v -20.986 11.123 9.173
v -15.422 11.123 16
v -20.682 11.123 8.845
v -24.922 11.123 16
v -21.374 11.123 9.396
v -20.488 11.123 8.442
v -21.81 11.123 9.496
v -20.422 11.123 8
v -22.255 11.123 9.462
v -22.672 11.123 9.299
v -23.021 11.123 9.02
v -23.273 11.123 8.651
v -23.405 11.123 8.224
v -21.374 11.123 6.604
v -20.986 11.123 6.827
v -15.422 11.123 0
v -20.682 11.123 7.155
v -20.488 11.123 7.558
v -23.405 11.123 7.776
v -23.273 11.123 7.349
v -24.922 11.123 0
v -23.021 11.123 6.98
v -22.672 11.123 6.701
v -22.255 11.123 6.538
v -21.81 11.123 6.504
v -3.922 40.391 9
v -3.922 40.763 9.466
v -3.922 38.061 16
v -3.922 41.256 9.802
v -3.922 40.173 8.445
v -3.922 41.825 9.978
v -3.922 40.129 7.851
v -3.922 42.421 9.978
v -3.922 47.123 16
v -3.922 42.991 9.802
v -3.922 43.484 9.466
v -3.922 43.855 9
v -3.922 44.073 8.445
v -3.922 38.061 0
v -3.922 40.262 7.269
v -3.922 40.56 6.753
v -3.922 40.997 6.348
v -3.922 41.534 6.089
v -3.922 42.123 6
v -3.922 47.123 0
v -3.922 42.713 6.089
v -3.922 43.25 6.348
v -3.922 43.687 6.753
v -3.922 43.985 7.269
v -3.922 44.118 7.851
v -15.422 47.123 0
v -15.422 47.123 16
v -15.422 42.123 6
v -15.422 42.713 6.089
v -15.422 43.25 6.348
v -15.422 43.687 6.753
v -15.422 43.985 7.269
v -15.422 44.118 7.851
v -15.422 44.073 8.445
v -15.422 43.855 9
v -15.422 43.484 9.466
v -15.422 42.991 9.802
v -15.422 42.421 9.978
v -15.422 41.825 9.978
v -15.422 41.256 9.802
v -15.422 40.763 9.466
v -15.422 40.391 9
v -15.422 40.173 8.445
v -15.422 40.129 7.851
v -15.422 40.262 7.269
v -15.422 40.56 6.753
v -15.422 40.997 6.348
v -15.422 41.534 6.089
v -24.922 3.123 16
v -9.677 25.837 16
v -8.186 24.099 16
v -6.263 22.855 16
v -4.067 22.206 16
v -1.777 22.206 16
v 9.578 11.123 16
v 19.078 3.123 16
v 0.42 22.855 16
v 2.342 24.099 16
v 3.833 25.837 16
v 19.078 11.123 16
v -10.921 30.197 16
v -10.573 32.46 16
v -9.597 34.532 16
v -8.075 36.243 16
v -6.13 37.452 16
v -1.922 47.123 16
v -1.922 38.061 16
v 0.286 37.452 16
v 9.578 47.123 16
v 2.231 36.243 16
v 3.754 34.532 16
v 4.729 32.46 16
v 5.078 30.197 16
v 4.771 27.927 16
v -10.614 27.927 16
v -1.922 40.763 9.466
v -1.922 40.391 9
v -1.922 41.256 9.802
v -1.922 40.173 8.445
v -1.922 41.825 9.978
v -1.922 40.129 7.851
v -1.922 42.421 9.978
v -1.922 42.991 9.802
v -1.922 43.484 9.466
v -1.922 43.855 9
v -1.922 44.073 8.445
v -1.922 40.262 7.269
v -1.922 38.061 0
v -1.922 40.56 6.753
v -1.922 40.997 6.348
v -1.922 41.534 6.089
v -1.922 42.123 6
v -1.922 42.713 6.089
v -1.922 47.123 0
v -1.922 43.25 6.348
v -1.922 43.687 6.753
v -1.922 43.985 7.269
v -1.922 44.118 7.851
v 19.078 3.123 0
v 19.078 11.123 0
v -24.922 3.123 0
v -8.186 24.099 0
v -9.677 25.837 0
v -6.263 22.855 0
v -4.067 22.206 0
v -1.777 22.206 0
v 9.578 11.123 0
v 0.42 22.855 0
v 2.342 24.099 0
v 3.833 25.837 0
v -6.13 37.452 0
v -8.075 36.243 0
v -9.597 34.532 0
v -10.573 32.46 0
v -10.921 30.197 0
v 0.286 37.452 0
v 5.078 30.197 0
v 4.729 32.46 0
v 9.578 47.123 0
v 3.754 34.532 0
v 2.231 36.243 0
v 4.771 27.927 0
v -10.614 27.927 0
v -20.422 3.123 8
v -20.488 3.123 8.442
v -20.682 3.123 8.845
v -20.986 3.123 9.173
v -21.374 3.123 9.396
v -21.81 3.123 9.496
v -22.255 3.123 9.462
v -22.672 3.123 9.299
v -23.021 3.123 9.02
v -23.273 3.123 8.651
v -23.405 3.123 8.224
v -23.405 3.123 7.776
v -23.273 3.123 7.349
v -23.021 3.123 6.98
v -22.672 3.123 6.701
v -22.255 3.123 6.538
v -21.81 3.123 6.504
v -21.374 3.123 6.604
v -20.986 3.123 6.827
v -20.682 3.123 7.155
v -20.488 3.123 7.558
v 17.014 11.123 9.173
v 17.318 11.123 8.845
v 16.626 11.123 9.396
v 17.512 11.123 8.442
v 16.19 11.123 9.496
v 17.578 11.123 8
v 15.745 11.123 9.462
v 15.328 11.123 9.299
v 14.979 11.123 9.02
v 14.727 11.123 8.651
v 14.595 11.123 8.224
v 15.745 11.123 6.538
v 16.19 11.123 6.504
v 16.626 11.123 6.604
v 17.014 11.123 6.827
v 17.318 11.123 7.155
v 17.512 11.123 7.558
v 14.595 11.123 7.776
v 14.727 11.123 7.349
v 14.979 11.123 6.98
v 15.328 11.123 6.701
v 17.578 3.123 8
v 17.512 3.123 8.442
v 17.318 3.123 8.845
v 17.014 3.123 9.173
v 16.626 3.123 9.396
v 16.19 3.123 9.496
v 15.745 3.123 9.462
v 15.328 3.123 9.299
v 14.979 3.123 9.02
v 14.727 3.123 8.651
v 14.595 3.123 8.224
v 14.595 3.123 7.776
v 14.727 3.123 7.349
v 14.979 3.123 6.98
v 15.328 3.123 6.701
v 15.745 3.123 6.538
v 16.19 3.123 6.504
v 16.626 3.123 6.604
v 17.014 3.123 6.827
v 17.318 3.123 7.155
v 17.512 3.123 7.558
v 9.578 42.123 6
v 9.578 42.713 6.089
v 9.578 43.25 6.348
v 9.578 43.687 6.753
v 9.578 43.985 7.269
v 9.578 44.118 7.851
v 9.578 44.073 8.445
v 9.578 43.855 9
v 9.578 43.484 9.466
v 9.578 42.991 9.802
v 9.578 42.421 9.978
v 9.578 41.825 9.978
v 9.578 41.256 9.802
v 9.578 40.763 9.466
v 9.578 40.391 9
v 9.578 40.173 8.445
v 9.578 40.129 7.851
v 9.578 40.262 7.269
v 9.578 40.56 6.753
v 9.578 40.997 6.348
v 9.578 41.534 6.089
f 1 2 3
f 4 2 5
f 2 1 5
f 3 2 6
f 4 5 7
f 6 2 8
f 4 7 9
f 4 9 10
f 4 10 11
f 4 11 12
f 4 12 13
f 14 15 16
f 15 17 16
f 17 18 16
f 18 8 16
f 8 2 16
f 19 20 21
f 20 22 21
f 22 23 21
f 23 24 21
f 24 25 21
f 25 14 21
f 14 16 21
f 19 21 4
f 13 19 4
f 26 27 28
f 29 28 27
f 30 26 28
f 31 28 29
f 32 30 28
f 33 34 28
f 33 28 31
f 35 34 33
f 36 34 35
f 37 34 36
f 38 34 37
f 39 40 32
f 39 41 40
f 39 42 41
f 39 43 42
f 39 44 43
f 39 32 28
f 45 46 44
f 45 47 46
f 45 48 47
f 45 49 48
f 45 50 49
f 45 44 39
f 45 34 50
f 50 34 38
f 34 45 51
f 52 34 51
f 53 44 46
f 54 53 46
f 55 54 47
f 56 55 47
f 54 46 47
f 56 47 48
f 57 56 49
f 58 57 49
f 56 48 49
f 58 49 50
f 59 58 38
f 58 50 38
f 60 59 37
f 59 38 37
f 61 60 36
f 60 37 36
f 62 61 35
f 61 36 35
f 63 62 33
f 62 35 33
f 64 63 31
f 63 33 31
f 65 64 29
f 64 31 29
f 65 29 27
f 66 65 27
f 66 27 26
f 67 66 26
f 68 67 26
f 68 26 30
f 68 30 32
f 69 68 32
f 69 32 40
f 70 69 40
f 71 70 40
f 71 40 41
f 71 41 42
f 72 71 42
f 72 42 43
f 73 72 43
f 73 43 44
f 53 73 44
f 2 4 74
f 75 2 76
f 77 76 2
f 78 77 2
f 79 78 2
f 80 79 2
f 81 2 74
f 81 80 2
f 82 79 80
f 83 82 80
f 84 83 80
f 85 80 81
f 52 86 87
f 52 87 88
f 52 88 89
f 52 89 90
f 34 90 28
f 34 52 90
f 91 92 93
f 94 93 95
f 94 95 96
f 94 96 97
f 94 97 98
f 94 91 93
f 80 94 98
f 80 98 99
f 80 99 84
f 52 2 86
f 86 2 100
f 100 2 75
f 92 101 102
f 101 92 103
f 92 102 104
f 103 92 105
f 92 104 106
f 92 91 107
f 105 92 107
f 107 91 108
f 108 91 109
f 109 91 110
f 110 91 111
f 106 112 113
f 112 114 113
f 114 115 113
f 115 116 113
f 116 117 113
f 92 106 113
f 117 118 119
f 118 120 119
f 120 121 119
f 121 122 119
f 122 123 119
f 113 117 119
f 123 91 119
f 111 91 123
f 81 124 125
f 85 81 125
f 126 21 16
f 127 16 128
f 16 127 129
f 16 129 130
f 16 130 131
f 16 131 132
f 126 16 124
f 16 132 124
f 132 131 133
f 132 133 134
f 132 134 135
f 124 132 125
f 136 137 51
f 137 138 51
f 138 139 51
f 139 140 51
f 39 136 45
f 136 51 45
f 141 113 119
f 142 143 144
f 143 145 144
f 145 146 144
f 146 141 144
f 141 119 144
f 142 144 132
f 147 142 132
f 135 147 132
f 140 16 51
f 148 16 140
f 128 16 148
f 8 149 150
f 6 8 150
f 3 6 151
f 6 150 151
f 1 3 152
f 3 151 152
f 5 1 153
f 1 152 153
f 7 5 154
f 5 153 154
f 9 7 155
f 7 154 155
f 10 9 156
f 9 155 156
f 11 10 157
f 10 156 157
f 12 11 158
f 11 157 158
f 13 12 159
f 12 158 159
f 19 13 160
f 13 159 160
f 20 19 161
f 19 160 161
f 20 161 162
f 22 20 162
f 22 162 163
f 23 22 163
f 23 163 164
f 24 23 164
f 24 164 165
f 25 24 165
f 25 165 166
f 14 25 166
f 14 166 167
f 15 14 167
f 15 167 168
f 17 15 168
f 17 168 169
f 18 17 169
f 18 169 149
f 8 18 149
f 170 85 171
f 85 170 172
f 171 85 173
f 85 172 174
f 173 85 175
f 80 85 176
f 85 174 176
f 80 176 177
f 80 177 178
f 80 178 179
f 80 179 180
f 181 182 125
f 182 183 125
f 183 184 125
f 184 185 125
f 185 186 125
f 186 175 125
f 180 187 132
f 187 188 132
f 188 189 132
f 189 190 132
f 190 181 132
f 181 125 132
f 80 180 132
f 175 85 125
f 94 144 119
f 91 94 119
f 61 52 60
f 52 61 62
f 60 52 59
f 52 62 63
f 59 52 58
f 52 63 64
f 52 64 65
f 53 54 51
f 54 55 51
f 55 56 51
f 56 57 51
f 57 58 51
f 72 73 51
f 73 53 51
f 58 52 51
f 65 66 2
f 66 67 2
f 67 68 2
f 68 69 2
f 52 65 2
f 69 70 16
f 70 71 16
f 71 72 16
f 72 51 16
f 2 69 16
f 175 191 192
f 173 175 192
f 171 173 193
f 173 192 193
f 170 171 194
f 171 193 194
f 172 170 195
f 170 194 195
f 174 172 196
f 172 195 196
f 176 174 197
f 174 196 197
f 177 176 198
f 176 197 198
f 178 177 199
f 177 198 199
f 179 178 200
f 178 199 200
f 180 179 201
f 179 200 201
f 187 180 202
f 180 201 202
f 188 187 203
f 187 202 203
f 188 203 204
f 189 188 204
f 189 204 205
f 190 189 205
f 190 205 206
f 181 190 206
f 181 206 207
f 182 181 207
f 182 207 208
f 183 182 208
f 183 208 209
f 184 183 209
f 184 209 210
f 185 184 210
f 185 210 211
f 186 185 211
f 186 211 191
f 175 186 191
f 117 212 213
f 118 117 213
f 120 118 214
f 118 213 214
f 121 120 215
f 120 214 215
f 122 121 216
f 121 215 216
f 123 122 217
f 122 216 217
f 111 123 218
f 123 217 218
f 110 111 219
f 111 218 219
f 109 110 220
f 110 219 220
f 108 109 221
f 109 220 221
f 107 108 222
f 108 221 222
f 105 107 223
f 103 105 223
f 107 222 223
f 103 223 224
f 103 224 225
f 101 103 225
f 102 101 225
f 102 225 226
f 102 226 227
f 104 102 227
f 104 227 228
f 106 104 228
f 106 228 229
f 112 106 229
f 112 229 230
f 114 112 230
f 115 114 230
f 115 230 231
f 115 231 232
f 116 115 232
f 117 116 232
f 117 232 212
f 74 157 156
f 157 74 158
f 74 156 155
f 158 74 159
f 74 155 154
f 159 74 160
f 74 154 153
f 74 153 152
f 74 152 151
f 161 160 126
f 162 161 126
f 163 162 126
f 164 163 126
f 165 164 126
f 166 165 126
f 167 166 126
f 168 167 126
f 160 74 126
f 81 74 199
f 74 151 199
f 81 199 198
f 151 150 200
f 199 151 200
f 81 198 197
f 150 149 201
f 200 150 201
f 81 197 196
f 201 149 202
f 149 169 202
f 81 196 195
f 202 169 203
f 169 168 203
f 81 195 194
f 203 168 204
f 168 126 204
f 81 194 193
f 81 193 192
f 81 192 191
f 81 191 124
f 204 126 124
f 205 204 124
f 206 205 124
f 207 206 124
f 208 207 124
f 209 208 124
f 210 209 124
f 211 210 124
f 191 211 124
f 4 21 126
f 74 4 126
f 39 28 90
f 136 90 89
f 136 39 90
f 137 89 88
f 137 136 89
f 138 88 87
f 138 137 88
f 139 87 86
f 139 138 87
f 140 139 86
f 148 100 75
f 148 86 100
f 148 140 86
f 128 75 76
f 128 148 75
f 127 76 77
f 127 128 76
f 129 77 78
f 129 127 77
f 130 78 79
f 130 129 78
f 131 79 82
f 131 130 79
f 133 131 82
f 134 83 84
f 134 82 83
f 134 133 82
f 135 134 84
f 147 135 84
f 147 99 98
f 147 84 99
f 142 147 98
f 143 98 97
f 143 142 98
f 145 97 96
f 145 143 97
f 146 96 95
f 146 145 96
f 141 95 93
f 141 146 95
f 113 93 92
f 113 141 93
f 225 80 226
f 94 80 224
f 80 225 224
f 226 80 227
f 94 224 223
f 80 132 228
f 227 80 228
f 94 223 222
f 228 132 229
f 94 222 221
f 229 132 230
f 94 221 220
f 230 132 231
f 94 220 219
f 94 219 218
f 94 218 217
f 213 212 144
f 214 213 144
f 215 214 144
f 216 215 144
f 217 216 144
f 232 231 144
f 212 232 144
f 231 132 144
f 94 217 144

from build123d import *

# Parameters (mm, degrees)
SKETCH_1_R          = 8
EXTRUDE_1_DEPTH     = 16
SKETCH_2_W          = 2
SKETCH_2_H          = 16
CUT_EXTRUDE_1_DEPTH = 16
SKETCH_3_R          = 2
CUT_EXTRUDE_2_DEPTH = 39
SKETCH_4_R          = 1.5
CUT_EXTRUDE_3_DEPTH = 39


with BuildPart() as part:
    # 草图1 → 凸台-拉伸1 (new body)
    with BuildSketch(Plane.XY):
        Polygon((-24.921659643, 3.123294018), (19.078340357, 3.123294018), (19.078340357, 11.123294018), (9.578340357, 11.123294018), (9.578340357, 47.123294018), (-15.421659643, 47.123294018), (-15.421659643, 11.123294018), (-24.921659643, 11.123294018), align=None)
        with Locations((-2.921659643, 30.123294018)):
            Circle(SKETCH_1_R, mode=Mode.SUBTRACT)
    extrude(amount=EXTRUDE_1_DEPTH)

    # 草图2 → 切除-拉伸1 (cut)
    with BuildSketch(Plane(origin=(0, 47.123294018, 0), x_dir=(1, 0, 0), z_dir=(0, 1, 0))):
        with Locations((-2.921659643, -8)):
            Rectangle(SKETCH_2_W, SKETCH_2_H)
    extrude(amount=-CUT_EXTRUDE_1_DEPTH, mode=Mode.SUBTRACT)

    # 草图3 → 切除-拉伸2 (cut)
    with BuildSketch(Plane(origin=(9.578340357, 0, 0), x_dir=(0, 0, -1), z_dir=(1, 0, 0))):
        with Locations((-8, 42.123294018)):
            Circle(SKETCH_3_R)
    extrude(amount=-CUT_EXTRUDE_2_DEPTH, mode=Mode.SUBTRACT)

    # 草图4 → 切除-拉伸3 (cut)
    with BuildSketch(Plane.XZ.offset(-3.123294018)):
        with Locations((-21.921659643, 8)):
            Circle(SKETCH_4_R)
        with Locations((16.078340357, 8)):
            Circle(SKETCH_4_R)
    extrude(amount=-CUT_EXTRUDE_3_DEPTH, mode=Mode.SUBTRACT)


solid = part.part
